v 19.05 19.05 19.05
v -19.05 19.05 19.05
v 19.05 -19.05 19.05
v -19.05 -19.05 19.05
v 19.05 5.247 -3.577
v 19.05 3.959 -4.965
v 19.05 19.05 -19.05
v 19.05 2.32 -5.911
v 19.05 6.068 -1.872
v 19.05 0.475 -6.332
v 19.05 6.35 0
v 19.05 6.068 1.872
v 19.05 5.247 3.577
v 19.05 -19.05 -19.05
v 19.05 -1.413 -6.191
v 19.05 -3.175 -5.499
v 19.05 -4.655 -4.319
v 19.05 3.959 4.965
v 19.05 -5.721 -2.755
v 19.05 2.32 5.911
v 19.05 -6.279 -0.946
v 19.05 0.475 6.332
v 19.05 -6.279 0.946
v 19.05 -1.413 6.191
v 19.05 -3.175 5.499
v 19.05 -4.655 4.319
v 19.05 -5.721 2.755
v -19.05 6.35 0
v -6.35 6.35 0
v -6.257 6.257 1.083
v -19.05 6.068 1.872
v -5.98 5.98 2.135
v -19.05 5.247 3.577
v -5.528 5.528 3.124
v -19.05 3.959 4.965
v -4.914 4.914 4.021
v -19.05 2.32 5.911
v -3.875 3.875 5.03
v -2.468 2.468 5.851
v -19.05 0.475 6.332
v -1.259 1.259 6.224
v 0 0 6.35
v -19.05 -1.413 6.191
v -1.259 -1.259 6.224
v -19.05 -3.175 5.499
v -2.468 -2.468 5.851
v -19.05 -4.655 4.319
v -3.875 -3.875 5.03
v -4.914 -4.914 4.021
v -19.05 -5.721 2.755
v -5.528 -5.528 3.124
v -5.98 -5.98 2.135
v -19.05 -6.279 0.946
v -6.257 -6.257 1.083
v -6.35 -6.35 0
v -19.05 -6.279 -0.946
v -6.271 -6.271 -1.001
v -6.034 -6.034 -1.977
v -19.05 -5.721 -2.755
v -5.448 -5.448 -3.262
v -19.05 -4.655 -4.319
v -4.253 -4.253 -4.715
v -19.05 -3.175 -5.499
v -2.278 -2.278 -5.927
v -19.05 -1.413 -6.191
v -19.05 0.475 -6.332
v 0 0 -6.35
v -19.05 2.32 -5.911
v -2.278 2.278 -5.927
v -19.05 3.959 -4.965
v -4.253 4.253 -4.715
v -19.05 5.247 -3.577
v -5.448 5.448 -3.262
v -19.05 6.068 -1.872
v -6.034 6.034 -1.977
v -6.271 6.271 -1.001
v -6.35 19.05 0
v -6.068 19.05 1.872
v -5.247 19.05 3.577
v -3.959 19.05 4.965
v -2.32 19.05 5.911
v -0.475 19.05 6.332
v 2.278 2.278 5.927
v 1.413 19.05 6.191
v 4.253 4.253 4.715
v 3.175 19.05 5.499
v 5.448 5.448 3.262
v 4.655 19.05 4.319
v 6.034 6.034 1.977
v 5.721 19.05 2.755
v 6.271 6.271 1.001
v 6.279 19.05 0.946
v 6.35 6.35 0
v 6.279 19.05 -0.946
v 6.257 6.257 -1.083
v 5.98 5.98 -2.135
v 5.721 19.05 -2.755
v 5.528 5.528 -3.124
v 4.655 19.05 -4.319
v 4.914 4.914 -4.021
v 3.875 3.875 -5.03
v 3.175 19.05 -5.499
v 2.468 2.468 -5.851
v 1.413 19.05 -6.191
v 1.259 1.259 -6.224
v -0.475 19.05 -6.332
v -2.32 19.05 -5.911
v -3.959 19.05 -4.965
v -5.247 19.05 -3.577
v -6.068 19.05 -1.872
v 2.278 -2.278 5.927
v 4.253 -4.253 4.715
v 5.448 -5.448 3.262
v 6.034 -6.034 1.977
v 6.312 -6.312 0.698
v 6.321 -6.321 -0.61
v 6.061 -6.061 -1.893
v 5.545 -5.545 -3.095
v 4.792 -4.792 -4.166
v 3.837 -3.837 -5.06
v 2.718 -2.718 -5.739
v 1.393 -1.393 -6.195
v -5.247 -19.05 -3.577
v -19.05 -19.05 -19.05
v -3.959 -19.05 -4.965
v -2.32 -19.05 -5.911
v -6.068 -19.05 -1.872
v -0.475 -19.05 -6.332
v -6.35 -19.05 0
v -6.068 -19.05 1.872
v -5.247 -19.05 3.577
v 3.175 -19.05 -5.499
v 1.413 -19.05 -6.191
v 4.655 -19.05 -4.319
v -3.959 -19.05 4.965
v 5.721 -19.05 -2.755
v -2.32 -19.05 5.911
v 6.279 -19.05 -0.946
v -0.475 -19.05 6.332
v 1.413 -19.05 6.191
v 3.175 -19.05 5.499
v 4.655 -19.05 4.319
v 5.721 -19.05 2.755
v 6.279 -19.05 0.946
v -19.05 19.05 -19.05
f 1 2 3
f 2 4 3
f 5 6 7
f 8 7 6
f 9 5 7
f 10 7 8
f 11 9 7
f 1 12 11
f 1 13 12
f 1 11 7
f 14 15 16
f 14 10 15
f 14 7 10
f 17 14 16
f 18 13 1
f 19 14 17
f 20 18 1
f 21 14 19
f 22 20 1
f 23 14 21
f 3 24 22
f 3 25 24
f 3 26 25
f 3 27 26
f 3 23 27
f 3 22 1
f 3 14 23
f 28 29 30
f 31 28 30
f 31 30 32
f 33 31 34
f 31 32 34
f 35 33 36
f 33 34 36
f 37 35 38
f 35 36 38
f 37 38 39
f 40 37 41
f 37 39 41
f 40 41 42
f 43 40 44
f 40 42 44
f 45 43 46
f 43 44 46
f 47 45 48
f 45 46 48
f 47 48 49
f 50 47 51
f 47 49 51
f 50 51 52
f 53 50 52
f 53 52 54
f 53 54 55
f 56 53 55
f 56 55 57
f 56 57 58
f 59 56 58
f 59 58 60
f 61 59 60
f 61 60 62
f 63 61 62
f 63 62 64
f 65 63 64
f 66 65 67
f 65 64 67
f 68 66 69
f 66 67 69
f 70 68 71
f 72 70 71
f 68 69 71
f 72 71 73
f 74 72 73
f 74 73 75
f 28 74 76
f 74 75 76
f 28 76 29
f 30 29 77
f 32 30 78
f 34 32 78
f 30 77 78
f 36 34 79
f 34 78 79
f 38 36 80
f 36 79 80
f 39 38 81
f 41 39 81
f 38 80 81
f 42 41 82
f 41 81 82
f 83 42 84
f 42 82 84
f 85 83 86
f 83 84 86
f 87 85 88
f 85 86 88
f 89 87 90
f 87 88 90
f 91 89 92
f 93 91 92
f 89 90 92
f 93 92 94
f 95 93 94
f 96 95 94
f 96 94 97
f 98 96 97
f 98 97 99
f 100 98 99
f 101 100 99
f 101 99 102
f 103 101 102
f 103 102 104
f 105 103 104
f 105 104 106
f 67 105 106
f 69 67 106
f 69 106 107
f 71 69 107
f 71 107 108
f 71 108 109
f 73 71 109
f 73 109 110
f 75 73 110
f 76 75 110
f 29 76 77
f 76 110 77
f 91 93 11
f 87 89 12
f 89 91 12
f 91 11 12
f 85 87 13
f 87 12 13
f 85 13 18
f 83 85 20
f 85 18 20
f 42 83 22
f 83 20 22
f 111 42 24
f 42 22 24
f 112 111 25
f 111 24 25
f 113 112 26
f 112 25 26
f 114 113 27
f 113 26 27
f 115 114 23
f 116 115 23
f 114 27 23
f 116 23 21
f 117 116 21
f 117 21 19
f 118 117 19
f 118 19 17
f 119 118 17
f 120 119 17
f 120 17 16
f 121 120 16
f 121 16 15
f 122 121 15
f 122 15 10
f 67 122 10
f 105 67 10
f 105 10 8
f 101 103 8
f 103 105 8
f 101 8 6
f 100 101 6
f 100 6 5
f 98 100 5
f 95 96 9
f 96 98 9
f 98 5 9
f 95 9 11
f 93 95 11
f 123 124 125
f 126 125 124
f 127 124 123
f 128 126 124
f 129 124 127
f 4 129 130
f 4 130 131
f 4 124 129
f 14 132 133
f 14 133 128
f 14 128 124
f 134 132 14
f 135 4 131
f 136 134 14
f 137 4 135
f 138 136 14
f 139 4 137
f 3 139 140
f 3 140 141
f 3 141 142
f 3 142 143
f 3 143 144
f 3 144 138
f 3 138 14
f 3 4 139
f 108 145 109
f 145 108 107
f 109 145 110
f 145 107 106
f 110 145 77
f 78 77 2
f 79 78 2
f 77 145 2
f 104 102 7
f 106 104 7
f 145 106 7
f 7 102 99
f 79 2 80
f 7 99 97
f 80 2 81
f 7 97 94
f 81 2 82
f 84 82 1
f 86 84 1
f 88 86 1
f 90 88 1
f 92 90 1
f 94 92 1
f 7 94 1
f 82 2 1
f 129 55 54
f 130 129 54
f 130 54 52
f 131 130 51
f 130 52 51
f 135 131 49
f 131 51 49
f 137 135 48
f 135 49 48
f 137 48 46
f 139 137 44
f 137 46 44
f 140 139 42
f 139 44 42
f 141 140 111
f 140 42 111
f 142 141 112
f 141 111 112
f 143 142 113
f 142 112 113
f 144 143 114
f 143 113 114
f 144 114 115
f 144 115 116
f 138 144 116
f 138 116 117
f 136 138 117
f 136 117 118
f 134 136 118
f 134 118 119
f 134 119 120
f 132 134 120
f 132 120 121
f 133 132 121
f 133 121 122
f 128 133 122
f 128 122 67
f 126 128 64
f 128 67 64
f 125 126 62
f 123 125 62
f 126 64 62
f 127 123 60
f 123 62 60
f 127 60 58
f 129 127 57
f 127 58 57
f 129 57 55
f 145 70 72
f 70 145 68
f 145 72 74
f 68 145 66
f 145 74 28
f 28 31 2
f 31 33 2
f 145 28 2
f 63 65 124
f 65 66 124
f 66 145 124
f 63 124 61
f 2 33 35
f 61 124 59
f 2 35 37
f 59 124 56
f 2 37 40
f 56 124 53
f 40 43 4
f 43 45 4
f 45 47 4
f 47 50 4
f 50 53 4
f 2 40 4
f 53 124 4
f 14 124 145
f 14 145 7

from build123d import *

# Parameters (mm, degrees)
F0_W       = 38.1
F0_H       = 38.1
F1_DEPTH   = 19.05
F4_D       = 12.7
F4_ON_F3_D = 12.7


with BuildPart() as f1:
    # F0 (on Front) → F1 (new body, symmetric)
    with BuildSketch(Plane.XZ):
        Rectangle(F0_W, F0_H)
    extrude(amount=F1_DEPTH, both=True)

    # F4 (through all)
    with Locations(Plane.XZ.offset(19.05)):
        with Locations((0, 0)):
            Hole(F4_D / 2)

    # F4 on F3 (through all)
    with Locations(Plane(origin=(-19.05, 0, 0), x_dir=(0, -1, 0), z_dir=(-1, 0, 0))):
        with Locations((0, 0)):
            Hole(F4_ON_F3_D / 2)


solid = f1.part
